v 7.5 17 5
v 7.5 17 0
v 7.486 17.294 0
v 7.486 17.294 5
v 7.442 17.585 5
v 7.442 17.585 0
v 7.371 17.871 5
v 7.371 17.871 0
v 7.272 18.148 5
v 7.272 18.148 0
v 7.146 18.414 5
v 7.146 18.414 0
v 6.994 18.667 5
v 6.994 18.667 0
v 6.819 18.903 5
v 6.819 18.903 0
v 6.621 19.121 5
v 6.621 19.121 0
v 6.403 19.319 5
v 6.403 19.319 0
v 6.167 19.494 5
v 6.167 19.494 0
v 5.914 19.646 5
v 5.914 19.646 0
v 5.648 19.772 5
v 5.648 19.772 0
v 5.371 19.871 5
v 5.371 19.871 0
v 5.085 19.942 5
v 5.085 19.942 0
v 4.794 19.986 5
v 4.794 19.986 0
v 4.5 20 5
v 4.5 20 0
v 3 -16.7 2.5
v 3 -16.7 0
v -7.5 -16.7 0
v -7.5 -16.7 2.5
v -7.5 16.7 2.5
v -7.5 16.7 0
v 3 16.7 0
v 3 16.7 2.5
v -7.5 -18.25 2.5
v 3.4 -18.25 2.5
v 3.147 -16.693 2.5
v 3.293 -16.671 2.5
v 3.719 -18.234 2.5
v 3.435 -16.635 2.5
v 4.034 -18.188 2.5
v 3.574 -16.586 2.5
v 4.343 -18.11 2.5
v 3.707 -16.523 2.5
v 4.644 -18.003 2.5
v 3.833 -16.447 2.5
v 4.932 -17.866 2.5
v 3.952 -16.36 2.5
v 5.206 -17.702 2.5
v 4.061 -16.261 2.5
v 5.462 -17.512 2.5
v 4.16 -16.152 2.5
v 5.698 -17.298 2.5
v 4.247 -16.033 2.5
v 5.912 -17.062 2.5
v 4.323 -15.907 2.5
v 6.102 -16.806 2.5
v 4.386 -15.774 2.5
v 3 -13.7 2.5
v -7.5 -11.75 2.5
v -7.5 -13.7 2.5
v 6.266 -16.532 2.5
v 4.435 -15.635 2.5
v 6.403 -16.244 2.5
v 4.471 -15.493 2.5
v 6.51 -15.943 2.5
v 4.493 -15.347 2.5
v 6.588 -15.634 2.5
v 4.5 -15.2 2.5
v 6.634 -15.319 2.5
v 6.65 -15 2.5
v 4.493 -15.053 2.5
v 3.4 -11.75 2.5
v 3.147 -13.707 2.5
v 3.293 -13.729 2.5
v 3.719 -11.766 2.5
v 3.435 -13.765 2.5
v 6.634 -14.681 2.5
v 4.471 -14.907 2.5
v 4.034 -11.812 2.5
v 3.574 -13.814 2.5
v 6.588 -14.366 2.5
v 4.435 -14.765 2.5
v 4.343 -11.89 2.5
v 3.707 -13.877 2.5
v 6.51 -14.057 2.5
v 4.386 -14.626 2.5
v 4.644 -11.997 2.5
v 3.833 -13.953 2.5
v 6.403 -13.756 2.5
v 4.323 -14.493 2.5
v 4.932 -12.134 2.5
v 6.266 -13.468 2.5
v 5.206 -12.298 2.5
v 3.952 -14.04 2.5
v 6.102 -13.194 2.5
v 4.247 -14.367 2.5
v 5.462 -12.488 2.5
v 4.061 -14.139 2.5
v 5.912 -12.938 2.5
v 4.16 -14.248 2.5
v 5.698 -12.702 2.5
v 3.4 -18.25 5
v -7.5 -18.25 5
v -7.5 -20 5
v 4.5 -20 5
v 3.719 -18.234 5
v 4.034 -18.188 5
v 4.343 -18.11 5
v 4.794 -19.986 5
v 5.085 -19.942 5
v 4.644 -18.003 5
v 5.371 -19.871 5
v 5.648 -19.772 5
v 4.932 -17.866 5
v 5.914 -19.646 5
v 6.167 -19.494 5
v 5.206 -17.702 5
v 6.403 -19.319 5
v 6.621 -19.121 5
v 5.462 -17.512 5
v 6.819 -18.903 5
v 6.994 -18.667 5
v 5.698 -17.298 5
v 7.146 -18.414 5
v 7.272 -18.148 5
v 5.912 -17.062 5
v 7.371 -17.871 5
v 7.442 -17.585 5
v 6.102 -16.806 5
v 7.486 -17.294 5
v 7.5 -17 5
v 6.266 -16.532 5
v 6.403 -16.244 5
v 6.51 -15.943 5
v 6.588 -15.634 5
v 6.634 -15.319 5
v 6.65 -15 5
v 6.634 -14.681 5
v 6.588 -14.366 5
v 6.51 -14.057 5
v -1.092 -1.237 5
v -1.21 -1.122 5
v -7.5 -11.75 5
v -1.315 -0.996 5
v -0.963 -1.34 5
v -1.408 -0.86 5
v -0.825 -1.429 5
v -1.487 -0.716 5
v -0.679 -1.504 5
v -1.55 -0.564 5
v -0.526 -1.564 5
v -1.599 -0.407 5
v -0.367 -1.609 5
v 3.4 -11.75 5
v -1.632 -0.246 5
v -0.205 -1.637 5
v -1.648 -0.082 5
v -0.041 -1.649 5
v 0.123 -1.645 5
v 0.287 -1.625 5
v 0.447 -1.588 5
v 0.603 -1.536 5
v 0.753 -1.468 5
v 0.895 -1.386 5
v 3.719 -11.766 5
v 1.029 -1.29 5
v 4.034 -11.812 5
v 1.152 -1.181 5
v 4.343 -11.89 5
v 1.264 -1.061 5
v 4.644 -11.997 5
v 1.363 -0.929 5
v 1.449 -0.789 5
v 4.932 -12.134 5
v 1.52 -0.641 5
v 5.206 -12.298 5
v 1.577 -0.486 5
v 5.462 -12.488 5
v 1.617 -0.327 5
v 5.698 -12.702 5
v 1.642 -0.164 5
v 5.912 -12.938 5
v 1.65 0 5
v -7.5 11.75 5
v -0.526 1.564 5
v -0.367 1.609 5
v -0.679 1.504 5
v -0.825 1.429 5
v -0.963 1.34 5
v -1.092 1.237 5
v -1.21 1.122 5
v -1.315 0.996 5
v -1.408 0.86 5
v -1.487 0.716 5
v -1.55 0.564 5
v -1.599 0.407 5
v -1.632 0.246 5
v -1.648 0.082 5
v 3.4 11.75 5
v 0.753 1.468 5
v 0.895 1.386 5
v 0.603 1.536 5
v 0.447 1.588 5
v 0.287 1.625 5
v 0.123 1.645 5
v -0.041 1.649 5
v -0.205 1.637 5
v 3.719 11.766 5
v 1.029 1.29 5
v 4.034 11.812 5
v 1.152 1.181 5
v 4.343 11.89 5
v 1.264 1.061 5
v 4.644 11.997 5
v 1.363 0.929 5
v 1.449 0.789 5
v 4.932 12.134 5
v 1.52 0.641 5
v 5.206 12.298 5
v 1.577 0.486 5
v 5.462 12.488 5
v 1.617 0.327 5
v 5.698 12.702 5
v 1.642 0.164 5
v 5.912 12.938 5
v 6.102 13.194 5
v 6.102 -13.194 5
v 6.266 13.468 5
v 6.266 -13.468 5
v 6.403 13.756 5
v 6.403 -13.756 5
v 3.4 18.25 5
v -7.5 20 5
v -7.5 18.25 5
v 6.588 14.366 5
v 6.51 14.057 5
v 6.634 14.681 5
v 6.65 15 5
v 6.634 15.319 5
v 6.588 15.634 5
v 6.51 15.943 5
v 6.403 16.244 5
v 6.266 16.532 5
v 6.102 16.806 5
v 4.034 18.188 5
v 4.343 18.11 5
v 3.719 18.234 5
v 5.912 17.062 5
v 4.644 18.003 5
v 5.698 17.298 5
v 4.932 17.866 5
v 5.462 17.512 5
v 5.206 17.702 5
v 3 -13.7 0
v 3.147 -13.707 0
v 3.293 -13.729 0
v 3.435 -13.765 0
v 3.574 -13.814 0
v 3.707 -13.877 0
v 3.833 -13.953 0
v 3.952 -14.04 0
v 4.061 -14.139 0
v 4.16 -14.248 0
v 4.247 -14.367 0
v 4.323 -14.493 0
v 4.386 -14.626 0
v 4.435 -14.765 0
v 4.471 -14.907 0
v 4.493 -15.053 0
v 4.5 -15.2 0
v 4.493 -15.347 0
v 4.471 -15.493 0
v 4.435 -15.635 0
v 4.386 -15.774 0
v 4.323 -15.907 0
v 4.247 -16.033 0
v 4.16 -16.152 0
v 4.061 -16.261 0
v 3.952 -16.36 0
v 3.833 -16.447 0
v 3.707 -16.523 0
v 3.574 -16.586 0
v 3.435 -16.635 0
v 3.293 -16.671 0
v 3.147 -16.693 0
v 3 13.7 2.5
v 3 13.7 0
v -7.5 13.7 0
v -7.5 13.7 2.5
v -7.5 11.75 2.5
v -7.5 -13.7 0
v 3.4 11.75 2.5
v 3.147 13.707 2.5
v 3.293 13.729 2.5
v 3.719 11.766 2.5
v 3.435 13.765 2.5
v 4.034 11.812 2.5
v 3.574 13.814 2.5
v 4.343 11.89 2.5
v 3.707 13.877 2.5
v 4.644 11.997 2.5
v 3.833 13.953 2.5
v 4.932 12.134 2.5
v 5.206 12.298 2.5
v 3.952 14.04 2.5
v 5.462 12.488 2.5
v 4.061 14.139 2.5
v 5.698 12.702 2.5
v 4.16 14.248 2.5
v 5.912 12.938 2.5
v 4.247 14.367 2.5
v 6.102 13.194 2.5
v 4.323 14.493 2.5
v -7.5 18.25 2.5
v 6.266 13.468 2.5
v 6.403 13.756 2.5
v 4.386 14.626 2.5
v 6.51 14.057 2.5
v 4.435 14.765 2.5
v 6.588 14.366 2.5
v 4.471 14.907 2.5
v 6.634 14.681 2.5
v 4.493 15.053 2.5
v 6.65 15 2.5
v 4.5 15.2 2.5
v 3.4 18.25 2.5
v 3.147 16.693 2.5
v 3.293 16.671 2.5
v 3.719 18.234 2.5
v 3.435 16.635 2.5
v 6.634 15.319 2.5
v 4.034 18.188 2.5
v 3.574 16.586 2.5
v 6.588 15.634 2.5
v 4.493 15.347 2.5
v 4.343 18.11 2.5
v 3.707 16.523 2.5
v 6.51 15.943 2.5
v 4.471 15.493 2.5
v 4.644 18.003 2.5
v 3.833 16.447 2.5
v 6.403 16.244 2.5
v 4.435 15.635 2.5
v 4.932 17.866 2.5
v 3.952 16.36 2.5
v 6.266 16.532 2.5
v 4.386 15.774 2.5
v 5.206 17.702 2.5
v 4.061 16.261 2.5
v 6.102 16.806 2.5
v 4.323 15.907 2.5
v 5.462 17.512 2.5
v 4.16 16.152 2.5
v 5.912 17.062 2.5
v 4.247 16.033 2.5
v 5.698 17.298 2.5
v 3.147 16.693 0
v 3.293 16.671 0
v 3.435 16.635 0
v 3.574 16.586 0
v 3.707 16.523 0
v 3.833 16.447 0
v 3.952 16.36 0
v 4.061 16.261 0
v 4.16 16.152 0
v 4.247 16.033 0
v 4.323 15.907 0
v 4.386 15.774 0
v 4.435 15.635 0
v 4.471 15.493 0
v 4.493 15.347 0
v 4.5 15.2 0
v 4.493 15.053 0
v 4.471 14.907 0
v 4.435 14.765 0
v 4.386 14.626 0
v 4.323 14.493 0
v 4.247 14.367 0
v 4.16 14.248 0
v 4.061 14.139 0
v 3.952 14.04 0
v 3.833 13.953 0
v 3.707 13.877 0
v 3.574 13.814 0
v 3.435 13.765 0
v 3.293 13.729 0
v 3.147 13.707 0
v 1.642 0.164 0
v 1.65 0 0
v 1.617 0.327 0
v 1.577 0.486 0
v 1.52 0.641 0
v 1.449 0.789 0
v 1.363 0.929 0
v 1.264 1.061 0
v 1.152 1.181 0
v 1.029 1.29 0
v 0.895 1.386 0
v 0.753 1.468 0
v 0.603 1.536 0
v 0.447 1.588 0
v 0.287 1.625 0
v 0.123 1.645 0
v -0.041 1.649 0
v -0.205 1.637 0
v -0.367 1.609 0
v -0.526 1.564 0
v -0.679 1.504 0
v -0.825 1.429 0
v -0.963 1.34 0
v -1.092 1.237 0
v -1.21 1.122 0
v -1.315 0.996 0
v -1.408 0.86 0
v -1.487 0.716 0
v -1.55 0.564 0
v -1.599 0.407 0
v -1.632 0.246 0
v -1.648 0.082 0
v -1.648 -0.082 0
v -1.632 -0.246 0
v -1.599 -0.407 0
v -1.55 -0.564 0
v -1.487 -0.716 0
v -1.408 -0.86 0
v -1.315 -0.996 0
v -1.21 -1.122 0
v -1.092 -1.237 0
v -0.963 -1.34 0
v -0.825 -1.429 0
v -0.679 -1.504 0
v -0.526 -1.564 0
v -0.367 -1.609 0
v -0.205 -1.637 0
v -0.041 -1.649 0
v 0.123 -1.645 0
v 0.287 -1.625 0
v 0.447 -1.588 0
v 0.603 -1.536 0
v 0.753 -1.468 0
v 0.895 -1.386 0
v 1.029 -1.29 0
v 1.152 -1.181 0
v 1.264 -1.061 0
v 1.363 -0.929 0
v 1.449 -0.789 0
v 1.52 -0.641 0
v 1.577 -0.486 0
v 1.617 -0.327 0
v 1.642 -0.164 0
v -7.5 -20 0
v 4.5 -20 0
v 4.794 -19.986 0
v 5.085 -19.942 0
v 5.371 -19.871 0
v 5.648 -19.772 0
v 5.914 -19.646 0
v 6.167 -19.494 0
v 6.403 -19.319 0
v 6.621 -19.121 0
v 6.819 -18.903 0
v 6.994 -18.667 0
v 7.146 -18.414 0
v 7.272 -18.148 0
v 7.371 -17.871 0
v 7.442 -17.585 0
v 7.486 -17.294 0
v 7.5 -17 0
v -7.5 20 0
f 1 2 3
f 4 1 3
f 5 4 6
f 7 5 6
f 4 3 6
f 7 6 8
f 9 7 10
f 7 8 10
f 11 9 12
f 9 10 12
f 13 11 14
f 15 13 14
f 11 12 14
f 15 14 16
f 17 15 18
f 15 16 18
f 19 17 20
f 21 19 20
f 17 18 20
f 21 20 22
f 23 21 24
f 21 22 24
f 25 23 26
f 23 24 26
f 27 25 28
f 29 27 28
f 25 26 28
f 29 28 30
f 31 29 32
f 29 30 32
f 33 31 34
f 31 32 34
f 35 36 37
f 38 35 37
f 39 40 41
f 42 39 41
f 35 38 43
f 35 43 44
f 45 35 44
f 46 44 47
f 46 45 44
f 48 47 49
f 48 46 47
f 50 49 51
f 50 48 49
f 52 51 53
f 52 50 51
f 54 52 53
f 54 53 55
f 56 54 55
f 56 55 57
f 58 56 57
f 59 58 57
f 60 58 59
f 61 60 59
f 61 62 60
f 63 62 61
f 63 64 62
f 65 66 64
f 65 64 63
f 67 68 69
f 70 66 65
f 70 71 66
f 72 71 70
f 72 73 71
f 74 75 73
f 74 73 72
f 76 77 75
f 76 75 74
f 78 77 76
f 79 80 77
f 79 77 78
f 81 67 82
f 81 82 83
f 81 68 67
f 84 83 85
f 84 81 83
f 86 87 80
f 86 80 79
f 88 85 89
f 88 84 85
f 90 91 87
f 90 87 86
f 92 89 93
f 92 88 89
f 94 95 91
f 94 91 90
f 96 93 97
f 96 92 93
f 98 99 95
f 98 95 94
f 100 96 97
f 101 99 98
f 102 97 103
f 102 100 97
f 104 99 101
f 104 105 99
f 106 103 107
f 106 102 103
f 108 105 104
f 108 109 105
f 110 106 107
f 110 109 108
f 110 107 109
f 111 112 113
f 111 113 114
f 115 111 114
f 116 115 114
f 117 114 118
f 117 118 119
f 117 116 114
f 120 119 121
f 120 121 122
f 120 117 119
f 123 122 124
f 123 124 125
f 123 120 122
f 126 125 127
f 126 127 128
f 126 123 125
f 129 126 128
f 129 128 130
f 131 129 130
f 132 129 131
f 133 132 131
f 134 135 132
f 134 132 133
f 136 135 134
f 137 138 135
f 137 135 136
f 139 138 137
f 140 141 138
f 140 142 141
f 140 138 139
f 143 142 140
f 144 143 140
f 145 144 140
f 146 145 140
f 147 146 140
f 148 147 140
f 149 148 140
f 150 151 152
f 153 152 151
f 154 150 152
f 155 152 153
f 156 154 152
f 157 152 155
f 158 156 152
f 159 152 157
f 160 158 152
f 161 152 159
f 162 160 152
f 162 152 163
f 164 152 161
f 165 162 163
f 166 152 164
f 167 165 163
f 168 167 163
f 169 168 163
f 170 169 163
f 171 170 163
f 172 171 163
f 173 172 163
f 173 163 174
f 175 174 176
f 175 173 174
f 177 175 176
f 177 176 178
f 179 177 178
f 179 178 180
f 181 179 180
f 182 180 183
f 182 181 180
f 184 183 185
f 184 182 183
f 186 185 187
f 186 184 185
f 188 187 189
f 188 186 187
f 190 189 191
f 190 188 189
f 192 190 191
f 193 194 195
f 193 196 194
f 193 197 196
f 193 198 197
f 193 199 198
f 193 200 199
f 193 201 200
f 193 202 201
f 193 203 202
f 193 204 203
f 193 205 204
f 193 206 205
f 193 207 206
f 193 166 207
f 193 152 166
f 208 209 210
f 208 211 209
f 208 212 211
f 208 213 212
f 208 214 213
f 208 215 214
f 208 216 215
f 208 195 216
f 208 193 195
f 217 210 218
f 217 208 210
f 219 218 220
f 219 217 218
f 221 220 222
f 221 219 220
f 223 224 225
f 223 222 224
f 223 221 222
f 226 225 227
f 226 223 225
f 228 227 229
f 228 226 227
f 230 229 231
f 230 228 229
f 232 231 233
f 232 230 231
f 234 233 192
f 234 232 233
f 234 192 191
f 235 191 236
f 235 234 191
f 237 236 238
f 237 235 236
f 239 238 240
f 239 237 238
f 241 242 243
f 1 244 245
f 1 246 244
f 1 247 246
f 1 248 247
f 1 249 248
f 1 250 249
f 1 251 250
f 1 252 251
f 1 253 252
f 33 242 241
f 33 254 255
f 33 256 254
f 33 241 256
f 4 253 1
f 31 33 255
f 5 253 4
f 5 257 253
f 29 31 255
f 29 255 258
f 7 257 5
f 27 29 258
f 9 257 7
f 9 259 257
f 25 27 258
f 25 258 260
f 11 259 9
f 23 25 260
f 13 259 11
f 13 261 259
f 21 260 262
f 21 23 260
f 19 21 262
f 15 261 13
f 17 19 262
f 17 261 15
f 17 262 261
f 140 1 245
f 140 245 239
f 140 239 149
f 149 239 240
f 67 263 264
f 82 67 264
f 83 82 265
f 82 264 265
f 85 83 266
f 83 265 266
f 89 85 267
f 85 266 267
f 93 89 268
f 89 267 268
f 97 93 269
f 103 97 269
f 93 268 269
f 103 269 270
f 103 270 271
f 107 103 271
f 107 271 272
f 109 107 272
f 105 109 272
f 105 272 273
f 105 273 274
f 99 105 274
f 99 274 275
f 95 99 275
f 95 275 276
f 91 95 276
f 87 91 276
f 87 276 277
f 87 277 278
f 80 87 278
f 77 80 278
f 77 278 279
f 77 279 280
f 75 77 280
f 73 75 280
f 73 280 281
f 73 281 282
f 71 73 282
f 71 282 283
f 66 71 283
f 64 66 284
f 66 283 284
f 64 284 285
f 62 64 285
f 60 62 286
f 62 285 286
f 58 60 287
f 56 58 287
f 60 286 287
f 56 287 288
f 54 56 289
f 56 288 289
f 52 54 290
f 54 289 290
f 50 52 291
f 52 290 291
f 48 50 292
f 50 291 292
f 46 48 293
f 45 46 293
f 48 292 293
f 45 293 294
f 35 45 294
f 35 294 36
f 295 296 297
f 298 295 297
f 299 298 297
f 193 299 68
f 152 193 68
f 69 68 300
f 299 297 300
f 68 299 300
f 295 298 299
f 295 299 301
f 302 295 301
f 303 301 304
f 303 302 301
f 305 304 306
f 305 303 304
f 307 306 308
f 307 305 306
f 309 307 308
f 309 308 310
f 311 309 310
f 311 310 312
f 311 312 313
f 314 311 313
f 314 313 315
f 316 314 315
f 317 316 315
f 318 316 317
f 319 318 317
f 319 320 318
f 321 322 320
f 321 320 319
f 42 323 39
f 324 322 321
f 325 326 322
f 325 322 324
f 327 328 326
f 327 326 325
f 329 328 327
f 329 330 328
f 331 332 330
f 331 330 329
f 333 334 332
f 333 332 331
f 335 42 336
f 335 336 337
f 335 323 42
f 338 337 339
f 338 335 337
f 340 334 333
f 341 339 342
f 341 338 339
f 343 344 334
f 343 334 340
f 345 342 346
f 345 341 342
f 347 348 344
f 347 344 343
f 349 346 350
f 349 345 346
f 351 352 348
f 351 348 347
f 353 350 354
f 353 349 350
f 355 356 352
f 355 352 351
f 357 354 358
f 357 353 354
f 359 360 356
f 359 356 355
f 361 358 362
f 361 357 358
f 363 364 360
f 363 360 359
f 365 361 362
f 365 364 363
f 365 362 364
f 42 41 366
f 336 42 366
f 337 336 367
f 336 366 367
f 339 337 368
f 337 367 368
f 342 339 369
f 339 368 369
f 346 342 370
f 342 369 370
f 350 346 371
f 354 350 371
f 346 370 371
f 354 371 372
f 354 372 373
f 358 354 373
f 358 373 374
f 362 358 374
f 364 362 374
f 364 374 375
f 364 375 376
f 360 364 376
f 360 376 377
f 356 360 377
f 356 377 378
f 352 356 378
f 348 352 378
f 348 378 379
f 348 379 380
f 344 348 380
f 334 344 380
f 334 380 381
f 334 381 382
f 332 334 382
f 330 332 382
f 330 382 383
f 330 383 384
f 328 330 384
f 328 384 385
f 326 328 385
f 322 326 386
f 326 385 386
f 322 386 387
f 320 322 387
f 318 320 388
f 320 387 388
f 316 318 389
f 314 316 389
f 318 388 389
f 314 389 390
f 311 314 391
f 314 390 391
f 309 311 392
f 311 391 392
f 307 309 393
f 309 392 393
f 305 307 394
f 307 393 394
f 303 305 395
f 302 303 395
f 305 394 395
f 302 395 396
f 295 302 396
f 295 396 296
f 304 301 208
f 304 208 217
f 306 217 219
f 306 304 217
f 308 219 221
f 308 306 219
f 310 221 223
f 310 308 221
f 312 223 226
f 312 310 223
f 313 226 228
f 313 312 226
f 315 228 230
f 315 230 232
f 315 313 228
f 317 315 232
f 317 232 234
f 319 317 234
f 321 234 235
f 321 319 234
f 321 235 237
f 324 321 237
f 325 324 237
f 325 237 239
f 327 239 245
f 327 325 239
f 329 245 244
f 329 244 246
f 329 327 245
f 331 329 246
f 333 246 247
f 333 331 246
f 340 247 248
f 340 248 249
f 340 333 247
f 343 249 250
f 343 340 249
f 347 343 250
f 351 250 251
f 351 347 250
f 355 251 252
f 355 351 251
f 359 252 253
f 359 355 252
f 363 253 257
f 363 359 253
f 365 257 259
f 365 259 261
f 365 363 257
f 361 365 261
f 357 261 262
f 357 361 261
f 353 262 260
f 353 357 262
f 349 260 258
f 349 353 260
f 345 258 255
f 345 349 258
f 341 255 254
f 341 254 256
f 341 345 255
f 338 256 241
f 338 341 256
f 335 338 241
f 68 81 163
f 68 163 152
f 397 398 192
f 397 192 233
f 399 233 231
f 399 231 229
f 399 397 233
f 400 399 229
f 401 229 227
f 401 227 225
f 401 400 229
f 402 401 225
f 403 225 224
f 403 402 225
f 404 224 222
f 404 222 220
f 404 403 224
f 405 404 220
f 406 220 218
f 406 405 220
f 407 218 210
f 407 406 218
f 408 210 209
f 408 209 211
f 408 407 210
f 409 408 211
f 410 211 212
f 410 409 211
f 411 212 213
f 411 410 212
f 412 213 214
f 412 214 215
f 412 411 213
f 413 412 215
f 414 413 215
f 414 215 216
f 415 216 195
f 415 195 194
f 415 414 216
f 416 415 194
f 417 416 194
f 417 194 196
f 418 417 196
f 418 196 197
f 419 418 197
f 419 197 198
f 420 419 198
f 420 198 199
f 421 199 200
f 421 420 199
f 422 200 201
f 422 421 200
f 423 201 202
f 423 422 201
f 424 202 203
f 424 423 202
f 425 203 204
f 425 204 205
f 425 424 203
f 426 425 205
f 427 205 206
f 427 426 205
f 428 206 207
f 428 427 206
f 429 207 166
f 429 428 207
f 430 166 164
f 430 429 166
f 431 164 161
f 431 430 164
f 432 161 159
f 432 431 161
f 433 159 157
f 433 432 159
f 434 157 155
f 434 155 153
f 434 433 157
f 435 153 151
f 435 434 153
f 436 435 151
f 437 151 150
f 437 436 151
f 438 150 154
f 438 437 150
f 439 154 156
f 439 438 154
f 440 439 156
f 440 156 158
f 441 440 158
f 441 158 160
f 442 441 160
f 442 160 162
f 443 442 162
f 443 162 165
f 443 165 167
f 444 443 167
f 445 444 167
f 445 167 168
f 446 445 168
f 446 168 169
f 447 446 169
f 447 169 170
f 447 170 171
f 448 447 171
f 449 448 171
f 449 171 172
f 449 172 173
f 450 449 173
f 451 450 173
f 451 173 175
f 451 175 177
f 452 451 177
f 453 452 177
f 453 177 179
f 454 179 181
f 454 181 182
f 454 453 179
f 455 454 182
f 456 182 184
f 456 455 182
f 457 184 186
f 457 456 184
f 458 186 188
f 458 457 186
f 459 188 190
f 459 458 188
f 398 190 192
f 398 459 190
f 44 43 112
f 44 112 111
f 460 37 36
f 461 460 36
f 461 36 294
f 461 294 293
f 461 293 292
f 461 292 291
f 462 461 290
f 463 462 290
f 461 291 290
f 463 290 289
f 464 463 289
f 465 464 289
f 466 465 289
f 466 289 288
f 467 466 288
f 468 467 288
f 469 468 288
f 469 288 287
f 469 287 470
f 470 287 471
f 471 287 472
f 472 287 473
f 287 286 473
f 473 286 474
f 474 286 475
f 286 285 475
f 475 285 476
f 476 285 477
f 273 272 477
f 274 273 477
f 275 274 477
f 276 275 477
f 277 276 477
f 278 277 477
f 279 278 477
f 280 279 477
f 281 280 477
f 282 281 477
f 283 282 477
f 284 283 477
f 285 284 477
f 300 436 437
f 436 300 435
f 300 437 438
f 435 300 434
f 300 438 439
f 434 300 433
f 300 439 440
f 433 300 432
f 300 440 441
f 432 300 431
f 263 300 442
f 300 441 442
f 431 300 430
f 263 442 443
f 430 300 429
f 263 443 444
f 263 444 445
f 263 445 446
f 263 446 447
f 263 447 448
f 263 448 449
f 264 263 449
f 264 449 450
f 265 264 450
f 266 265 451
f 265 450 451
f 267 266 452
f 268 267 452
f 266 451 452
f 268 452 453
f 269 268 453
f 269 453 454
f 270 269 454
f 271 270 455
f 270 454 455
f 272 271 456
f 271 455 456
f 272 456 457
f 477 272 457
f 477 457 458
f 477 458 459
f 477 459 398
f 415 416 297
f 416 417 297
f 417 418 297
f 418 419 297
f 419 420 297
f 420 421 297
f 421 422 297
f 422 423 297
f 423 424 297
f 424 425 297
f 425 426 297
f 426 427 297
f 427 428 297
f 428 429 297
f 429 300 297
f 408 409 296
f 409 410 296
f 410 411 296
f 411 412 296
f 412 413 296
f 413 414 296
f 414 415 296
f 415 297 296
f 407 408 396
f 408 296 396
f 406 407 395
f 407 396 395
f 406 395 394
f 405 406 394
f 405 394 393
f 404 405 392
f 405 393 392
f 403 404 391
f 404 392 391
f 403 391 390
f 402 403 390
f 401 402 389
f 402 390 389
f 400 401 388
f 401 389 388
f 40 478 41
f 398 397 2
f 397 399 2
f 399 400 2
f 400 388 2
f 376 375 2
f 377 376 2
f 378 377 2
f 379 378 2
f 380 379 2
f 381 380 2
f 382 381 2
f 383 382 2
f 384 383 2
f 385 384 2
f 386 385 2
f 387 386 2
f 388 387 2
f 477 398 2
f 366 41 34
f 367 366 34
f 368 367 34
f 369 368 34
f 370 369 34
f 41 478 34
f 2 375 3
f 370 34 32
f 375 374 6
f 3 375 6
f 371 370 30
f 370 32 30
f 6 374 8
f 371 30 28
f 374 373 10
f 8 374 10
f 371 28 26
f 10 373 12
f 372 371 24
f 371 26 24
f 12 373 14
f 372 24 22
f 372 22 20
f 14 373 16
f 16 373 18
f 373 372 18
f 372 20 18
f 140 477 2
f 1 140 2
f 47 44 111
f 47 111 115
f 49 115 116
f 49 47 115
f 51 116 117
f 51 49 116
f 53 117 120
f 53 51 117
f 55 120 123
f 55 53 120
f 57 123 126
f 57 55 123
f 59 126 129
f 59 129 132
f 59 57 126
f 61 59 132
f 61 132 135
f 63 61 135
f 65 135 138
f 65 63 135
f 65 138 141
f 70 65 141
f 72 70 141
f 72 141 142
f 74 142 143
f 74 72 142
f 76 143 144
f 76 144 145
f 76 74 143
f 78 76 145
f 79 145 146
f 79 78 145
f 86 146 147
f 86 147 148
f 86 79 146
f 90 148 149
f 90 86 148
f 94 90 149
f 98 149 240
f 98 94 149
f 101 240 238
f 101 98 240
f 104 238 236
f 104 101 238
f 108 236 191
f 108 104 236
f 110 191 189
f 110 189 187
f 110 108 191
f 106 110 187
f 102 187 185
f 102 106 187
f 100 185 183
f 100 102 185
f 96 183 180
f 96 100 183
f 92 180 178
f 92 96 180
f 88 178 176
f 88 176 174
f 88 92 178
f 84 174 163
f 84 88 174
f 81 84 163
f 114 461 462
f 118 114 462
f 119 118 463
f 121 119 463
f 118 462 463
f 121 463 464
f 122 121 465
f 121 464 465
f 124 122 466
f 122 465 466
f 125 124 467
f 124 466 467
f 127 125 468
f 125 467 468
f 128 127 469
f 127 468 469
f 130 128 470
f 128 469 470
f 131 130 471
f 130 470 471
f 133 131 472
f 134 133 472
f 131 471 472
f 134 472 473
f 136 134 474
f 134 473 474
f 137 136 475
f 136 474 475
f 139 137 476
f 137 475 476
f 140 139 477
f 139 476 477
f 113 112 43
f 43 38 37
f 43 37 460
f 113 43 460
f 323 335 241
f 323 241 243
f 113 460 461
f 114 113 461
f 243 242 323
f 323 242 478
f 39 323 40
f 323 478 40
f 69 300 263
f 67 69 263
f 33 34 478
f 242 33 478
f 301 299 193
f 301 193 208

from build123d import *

# Parameters (mm, degrees)
SKETCH1_R           = 1.65
BOSS_EXTRUDE1_DEPTH = 5
CUT_EXTRUDE1_START  = -2.5
CUT_EXTRUDE1_DEPTH  = 2.5


with BuildPart() as part:
    # Sketch1 → Boss-Extrude1 (new body)
    with BuildSketch(Plane.XY):
        with BuildLine():
            Line((-7.5, 16.7), (3, 16.7))
            ThreePointArc((3, 16.7), (4.5, 15.2), (3, 13.7))
            Line((3, 13.7), (-7.5, 13.7))
            Line((-7.5, 13.7), (-7.5, -13.7))
            Line((-7.5, -13.7), (3, -13.7))
            ThreePointArc((3, -13.7), (4.5, -15.2), (3, -16.7))
            Line((3, -16.7), (-7.5, -16.7))
            Line((-7.5, -16.7), (-7.5, -20))
            Line((-7.5, -20), (4.5, -20))
            ThreePointArc((4.5, -20), (6.621320344, -19.121320344), (7.5, -17))
            Line((7.5, -17), (7.5, 17))
            ThreePointArc((7.5, 17), (6.621320344, 19.121320344), (4.5, 20))
            Line((4.5, 20), (-7.5, 20))
            Line((-7.5, 20), (-7.5, 16.7))
        make_face()
        Circle(SKETCH1_R, mode=Mode.SUBTRACT)
    extrude(amount=BOSS_EXTRUDE1_DEPTH)

    # Sketch2 → Cut-Extrude1 (cut)
    with BuildSketch(Plane.XY.offset(5).offset(CUT_EXTRUDE1_START)):
        with BuildLine():
            Line((3.4, -11.75), (-7.5, -11.75))
            Line((-7.5, -11.75), (-7.5, -13.7))
            Line((-7.5, -13.7), (3, -13.7))
            ThreePointArc((3, -13.7), (4.5, -15.2), (3, -16.7))
            Line((3, -16.7), (-7.5, -16.7))
            Line((-7.5, -16.7), (-7.5, -18.25))
            Line((-7.5, -18.25), (3.4, -18.25))
            ThreePointArc((3.4, -18.25), (6.65, -15), (3.4, -11.75))
        make_face()
        with BuildLine():
            Line((3.4, 18.25), (-7.5, 18.25))
            Line((-7.5, 18.25), (-7.5, 16.7))
            Line((-7.5, 16.7), (3, 16.7))
            ThreePointArc((3, 16.7), (4.5, 15.2), (3, 13.7))
            Line((3, 13.7), (-7.5, 13.7))
            Line((-7.5, 13.7), (-7.5, 11.75))
            Line((-7.5, 11.75), (3.4, 11.75))
            ThreePointArc((3.4, 11.75), (6.65, 15), (3.4, 18.25))
        make_face()
    extrude(amount=CUT_EXTRUDE1_DEPTH, mode=Mode.SUBTRACT)


solid = part.part
